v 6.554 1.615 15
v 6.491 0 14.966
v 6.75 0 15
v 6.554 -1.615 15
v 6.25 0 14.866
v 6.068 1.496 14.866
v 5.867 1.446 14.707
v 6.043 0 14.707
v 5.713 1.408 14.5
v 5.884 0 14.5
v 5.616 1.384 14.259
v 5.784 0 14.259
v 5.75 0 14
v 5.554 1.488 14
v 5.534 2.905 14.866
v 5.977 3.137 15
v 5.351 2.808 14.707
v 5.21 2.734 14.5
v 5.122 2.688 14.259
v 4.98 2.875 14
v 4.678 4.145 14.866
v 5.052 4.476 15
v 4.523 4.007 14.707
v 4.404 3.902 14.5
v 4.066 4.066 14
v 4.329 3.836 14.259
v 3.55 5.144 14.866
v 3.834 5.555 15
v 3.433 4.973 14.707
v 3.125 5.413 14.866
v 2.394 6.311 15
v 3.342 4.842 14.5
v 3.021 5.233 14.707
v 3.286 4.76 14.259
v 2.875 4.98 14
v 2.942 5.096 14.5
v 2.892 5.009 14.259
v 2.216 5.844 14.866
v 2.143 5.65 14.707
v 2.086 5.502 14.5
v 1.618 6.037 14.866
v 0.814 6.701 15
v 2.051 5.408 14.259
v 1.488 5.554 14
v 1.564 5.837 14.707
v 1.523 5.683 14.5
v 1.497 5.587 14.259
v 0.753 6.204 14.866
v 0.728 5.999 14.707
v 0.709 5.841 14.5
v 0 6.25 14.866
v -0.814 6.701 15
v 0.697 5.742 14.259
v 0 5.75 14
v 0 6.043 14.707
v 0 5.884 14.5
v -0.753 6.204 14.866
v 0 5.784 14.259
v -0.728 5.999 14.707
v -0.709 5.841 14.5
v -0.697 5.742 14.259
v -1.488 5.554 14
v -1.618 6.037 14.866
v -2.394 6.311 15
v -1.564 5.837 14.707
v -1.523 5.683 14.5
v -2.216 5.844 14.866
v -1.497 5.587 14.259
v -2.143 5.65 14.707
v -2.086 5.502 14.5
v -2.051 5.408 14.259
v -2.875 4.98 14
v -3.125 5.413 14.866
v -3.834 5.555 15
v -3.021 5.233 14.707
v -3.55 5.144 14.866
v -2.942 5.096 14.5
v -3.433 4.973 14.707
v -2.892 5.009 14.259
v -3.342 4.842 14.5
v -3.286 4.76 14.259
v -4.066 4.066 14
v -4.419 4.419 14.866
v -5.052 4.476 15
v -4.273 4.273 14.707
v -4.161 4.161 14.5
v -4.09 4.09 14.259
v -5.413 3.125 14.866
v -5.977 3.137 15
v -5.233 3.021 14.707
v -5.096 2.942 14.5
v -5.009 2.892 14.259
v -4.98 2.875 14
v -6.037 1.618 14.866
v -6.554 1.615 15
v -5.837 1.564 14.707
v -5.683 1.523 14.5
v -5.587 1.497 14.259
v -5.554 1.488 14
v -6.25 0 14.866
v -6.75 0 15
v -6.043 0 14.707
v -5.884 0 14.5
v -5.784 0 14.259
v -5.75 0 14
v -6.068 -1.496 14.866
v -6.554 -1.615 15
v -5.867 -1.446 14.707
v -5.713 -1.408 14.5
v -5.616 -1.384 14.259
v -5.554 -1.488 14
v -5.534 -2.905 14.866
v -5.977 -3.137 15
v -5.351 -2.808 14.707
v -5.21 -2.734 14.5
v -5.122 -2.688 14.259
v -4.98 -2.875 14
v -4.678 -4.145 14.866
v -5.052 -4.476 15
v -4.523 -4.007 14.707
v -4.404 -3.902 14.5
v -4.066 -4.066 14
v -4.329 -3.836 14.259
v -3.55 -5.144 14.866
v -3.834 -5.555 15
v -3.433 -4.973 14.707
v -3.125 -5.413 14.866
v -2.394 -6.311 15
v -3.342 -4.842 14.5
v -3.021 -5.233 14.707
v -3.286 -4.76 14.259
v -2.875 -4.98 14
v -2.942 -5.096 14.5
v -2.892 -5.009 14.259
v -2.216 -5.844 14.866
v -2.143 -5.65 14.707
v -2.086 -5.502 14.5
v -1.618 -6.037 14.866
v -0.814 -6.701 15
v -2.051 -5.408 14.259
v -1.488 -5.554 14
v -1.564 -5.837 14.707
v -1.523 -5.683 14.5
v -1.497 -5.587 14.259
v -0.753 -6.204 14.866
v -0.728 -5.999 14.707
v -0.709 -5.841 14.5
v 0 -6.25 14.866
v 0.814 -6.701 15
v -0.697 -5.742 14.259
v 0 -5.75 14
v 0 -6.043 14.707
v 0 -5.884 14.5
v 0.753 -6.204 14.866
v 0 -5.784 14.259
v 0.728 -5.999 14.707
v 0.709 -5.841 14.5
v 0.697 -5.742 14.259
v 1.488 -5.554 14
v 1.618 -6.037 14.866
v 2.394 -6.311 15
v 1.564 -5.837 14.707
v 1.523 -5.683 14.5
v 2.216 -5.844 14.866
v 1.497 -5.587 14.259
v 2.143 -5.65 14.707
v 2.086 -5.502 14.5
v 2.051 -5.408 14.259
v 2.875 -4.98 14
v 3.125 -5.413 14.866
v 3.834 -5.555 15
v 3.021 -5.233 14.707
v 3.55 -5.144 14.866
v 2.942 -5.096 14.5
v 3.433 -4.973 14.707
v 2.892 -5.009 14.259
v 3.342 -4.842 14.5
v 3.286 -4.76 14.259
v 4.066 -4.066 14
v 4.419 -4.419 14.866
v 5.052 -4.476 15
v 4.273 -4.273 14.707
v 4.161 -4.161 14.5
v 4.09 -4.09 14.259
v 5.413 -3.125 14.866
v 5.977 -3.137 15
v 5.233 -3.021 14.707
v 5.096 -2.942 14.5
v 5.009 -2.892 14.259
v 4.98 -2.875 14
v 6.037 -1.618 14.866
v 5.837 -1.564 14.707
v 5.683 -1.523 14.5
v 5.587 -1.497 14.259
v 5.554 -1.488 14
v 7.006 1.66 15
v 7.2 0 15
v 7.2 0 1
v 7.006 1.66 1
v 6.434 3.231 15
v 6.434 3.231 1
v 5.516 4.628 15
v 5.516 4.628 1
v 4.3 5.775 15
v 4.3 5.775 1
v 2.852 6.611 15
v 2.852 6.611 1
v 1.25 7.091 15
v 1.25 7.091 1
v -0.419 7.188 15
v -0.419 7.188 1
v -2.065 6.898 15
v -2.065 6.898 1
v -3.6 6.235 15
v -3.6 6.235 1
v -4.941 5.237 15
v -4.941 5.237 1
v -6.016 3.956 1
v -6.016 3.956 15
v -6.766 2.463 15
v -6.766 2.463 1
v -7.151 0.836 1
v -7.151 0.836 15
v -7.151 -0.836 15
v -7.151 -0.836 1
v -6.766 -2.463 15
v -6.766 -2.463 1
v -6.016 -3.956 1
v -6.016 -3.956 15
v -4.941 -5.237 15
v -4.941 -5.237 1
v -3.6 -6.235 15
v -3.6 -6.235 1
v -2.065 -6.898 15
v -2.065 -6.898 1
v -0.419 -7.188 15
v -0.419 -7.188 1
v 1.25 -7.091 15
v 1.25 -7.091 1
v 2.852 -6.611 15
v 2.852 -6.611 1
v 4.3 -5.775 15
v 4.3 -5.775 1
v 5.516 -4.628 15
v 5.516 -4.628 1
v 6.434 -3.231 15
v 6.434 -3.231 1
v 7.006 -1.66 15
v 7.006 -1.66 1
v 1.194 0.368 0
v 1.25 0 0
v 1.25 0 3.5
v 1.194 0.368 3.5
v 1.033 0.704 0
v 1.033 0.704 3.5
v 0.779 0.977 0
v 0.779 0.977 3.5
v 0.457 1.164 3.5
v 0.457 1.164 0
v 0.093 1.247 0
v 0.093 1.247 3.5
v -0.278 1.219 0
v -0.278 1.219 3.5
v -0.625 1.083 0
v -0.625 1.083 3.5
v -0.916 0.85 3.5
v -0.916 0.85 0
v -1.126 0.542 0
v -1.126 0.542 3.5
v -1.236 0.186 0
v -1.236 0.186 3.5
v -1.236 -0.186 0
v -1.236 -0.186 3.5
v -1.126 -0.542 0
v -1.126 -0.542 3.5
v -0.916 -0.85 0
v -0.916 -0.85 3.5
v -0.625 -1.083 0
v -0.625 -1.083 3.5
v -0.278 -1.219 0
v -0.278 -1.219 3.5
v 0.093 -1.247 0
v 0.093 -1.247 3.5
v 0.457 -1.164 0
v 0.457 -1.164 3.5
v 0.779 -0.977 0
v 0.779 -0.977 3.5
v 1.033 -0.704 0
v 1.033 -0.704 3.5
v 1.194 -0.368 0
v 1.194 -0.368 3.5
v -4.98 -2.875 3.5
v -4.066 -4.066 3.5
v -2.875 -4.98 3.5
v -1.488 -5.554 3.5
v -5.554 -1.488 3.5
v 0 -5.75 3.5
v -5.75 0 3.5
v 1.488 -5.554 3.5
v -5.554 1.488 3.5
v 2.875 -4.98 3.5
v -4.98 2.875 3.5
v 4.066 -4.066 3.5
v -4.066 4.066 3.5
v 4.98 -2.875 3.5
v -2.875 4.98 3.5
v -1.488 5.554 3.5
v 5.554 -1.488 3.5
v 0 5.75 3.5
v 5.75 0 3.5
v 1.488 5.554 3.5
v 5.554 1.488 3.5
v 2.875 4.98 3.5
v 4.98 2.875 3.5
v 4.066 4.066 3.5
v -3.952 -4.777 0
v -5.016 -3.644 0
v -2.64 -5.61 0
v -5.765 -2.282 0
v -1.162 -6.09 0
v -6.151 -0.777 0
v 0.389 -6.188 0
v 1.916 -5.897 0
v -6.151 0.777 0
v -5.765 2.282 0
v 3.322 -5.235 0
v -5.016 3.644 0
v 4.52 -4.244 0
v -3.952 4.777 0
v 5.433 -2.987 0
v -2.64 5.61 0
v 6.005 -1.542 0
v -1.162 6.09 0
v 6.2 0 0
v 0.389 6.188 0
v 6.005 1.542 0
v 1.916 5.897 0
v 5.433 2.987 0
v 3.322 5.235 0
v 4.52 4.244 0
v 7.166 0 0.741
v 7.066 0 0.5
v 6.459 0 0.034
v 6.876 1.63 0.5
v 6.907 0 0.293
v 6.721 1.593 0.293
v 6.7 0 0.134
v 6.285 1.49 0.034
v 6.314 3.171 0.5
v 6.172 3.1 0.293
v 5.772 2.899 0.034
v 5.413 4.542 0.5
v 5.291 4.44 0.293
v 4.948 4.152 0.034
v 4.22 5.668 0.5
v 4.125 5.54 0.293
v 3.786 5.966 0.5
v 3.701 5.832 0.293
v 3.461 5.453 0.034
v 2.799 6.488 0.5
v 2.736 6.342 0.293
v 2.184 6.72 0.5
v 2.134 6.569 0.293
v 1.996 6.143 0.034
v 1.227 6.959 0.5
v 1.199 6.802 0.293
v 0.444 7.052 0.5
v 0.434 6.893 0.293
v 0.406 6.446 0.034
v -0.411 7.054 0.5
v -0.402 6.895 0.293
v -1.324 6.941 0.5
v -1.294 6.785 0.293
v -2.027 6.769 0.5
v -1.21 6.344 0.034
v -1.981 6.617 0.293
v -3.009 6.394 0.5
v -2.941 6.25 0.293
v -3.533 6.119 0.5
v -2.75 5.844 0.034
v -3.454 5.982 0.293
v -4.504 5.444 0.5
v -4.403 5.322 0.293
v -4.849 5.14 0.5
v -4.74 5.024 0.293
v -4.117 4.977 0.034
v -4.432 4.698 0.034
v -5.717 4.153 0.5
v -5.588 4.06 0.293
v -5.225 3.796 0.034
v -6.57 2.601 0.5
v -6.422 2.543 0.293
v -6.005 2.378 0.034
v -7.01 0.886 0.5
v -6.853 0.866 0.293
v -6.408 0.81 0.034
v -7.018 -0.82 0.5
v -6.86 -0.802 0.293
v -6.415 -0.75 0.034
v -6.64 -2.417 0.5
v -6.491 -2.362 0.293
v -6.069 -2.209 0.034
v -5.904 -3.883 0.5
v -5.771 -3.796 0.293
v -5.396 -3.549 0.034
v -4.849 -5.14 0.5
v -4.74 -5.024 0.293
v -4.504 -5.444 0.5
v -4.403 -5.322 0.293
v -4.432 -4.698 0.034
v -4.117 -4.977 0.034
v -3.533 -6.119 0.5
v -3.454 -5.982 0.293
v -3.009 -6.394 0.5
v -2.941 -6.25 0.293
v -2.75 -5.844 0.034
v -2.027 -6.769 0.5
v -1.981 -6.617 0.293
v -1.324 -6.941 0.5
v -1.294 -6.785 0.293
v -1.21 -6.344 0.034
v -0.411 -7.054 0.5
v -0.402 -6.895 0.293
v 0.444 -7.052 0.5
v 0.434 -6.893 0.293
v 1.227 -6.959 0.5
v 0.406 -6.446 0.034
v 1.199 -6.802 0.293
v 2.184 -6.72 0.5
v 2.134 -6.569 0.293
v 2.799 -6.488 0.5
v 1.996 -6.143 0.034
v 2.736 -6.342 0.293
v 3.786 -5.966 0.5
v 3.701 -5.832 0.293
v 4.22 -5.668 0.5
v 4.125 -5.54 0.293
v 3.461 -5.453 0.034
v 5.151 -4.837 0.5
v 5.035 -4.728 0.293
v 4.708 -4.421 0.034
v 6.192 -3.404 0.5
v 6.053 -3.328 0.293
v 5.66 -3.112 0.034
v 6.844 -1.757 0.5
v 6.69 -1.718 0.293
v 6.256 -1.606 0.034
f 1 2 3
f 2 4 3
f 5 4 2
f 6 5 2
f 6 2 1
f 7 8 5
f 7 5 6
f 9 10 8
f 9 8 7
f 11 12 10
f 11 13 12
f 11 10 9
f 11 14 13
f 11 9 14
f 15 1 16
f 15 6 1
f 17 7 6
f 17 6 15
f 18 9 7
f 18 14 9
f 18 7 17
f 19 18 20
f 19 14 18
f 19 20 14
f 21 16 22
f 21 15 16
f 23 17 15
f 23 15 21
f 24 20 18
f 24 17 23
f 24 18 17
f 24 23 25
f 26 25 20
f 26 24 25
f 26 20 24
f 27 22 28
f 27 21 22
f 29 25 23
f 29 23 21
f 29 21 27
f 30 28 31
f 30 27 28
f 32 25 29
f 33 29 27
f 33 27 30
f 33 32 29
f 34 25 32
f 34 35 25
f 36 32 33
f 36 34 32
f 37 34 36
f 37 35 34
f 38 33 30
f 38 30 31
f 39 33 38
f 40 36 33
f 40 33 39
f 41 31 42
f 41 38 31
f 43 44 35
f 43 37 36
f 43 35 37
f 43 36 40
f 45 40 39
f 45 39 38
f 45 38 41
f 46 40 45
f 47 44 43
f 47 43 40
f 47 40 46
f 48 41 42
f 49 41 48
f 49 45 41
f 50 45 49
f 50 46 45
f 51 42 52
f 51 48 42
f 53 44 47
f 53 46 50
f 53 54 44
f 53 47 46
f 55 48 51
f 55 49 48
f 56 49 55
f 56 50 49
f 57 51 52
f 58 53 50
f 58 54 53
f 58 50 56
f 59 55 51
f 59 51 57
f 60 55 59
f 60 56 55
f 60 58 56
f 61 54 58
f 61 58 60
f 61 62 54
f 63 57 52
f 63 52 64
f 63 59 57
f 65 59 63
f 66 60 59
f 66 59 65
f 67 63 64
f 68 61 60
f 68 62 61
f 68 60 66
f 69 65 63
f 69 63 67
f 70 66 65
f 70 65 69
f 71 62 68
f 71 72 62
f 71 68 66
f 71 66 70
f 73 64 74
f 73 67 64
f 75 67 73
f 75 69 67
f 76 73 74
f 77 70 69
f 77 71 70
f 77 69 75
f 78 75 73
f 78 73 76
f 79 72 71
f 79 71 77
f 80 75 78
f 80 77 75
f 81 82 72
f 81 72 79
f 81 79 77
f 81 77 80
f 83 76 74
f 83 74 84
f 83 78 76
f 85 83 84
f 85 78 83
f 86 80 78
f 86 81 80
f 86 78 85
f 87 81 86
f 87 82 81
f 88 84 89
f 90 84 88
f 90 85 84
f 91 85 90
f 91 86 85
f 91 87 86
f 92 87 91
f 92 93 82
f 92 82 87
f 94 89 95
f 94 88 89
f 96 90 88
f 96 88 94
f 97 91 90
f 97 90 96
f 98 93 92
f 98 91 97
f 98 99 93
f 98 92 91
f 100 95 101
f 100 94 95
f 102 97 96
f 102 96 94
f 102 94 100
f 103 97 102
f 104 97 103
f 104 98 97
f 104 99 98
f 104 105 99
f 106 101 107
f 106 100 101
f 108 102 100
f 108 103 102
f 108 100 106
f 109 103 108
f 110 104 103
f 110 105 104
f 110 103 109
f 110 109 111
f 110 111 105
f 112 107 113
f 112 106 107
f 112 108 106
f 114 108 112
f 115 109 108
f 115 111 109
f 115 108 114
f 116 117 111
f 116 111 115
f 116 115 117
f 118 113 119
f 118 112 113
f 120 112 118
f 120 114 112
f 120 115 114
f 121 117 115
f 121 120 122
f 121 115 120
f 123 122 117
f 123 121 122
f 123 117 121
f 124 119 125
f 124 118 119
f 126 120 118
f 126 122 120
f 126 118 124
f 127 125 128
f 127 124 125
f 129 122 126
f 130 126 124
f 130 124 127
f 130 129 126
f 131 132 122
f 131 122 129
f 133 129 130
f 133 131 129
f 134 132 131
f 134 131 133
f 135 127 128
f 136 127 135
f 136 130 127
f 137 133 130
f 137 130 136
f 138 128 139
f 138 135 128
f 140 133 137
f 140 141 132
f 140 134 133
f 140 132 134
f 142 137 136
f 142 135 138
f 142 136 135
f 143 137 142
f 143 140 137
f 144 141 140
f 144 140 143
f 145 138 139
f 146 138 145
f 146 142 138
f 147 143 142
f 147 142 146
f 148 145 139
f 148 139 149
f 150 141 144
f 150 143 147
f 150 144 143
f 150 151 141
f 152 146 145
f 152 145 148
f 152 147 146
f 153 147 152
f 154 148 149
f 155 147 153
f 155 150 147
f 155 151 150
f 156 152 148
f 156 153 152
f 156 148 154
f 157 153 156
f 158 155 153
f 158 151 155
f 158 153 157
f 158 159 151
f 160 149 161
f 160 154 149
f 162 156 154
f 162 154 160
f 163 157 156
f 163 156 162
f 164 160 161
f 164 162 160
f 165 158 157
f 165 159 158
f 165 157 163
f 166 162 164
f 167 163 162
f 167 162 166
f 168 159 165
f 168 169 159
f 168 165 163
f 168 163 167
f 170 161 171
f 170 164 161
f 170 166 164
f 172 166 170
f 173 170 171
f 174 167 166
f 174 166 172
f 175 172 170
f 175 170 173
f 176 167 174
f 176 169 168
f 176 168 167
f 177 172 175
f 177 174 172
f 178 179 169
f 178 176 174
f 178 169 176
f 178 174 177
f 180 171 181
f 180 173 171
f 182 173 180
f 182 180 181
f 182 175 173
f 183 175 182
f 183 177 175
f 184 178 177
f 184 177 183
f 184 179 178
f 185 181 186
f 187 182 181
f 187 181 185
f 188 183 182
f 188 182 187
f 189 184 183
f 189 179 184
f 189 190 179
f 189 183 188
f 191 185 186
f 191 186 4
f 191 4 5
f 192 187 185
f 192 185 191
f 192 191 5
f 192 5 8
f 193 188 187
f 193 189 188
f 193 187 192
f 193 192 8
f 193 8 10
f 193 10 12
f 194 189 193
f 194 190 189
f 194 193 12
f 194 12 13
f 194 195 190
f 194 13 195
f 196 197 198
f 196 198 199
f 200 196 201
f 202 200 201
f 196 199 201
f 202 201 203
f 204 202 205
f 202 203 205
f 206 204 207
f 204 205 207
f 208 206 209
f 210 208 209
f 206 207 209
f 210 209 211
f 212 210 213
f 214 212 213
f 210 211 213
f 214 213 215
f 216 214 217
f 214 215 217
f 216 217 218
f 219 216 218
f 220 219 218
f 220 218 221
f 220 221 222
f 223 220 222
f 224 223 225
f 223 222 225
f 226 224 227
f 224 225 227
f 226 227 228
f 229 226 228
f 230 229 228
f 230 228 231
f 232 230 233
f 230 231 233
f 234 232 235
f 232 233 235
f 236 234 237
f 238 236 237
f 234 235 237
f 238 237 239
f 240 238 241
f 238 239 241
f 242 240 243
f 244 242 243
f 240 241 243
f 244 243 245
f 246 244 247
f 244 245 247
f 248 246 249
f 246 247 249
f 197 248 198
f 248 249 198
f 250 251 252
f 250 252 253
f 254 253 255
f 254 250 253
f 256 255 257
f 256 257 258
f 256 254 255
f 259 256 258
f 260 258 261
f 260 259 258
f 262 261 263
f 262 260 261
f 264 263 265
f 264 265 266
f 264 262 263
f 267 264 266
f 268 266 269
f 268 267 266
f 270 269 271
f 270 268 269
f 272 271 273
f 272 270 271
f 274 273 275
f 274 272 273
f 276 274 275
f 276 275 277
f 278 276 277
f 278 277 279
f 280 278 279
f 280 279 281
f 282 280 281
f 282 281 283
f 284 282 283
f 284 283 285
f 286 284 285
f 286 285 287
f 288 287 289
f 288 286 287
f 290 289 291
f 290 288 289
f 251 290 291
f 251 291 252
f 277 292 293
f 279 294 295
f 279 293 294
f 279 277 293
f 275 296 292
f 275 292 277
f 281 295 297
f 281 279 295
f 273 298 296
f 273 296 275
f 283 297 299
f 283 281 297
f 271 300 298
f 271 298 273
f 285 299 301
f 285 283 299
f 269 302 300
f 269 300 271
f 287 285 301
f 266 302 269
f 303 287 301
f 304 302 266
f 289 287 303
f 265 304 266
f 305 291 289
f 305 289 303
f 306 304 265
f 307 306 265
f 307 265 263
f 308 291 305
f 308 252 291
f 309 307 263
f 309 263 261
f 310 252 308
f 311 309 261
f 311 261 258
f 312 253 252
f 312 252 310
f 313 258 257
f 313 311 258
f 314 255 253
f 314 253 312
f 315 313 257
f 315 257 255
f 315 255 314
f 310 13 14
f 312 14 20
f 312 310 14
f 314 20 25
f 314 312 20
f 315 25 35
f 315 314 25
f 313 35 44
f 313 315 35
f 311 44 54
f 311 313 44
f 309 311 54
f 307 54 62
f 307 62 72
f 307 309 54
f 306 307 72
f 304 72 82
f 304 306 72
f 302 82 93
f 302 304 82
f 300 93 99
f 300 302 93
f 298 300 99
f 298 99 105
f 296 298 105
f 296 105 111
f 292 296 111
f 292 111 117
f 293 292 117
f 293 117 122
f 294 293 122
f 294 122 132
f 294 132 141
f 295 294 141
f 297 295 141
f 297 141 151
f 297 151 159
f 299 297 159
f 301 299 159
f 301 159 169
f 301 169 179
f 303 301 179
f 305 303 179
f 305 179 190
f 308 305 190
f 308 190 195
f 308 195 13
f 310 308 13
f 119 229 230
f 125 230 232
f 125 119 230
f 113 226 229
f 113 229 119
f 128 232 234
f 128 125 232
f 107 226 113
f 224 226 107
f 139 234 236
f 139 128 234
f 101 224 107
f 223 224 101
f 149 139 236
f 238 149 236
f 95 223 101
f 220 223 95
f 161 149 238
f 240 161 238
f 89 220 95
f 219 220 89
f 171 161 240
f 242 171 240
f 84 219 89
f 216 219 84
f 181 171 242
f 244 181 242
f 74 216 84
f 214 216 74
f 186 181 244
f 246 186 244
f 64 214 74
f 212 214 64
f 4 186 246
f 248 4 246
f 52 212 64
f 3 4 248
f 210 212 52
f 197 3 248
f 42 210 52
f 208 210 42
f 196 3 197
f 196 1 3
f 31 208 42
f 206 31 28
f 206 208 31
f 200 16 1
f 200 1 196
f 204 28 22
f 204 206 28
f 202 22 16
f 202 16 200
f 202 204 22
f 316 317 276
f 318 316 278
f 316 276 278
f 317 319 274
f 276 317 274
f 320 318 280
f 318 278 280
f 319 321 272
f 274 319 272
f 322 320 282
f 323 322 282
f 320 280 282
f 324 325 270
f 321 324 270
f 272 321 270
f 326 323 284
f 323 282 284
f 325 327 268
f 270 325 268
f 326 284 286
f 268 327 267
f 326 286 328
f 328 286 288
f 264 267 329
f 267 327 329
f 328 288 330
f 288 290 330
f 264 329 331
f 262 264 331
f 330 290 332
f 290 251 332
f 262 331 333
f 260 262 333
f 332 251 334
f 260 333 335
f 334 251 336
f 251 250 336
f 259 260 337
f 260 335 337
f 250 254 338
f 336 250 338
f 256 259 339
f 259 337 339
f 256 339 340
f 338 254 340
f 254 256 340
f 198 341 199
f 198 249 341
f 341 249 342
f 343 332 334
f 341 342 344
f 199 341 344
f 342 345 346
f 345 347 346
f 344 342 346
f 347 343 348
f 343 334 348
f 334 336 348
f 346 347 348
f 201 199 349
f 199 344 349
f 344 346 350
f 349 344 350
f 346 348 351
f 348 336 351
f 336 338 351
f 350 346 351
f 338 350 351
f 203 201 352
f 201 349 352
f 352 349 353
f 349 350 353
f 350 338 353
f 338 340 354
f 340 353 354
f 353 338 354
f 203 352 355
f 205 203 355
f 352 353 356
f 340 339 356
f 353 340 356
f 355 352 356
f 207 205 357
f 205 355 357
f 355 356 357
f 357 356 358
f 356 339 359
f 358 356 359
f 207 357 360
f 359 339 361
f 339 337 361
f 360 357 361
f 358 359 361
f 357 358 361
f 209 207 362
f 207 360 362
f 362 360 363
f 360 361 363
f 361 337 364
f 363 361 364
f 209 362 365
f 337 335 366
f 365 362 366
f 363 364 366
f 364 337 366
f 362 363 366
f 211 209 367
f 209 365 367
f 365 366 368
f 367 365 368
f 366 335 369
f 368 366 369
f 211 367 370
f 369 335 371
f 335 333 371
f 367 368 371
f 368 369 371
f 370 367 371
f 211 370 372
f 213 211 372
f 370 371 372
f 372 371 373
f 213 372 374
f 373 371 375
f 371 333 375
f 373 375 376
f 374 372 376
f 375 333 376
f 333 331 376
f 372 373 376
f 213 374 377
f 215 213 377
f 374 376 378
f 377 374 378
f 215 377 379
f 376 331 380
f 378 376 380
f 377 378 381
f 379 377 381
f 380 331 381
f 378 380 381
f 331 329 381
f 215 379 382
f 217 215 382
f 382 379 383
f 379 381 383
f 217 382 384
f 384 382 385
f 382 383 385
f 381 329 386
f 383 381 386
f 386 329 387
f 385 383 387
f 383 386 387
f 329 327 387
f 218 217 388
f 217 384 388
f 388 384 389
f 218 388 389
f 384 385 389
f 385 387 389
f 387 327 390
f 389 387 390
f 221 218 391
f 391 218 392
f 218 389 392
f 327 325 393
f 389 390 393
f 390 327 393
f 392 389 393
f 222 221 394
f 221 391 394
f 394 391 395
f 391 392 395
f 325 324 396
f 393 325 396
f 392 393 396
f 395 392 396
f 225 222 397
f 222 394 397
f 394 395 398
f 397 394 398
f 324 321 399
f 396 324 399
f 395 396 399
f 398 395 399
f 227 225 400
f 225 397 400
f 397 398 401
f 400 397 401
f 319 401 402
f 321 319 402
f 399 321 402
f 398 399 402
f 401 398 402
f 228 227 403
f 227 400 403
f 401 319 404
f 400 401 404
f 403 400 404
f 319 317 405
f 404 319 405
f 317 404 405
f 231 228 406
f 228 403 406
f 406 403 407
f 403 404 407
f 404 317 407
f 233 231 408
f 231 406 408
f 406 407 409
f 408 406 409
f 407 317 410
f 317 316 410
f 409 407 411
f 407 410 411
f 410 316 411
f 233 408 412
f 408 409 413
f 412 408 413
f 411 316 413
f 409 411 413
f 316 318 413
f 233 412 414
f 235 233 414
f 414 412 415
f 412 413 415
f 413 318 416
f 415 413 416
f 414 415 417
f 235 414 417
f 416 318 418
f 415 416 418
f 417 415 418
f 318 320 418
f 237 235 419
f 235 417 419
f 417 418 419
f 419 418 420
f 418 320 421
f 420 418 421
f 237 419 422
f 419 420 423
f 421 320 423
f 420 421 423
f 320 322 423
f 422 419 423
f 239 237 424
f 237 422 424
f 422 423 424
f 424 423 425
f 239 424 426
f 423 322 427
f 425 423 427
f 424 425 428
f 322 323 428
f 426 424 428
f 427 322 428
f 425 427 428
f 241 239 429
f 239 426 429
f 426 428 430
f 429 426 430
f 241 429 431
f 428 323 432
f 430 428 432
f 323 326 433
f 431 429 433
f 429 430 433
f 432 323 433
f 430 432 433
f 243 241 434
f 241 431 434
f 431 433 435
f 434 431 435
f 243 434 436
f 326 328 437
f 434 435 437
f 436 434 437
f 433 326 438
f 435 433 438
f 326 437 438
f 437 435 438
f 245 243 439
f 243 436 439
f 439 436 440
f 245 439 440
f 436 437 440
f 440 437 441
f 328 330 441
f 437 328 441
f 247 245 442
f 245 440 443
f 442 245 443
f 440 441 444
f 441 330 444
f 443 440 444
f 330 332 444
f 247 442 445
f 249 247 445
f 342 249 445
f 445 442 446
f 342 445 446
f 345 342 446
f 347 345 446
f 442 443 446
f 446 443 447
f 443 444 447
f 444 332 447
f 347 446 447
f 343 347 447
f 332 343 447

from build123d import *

# Parameters (mm, degrees)
F0_R     = 7.2
F0_R_2   = 1.25
F1_DEPTH = 3.5
F2_R     = 7.2
F2_R_2   = 5.75
F3_DEPTH = 15
F4_R     = 1


with BuildPart() as f1:
    # F0 (on Top) → F1 (new body)
    with BuildSketch(Plane.XY):
        Circle(F0_R)
        Circle(F0_R_2, mode=Mode.SUBTRACT)
    extrude(amount=F1_DEPTH)

    # F2 (on Top) → F3 (join)
    with BuildSketch(Plane.XY):
        Circle(F2_R)
        Circle(F2_R_2, mode=Mode.SUBTRACT)
    extrude(amount=F3_DEPTH)

    # F4
    f4_edges = [f1.edges().sort_by_distance(p)[0] for p in [
        (-7.2, 0, 0),
        (-5.75, 0, 15),
    ]]
    fillet(f4_edges, radius=F4_R)


solid = f1.part
